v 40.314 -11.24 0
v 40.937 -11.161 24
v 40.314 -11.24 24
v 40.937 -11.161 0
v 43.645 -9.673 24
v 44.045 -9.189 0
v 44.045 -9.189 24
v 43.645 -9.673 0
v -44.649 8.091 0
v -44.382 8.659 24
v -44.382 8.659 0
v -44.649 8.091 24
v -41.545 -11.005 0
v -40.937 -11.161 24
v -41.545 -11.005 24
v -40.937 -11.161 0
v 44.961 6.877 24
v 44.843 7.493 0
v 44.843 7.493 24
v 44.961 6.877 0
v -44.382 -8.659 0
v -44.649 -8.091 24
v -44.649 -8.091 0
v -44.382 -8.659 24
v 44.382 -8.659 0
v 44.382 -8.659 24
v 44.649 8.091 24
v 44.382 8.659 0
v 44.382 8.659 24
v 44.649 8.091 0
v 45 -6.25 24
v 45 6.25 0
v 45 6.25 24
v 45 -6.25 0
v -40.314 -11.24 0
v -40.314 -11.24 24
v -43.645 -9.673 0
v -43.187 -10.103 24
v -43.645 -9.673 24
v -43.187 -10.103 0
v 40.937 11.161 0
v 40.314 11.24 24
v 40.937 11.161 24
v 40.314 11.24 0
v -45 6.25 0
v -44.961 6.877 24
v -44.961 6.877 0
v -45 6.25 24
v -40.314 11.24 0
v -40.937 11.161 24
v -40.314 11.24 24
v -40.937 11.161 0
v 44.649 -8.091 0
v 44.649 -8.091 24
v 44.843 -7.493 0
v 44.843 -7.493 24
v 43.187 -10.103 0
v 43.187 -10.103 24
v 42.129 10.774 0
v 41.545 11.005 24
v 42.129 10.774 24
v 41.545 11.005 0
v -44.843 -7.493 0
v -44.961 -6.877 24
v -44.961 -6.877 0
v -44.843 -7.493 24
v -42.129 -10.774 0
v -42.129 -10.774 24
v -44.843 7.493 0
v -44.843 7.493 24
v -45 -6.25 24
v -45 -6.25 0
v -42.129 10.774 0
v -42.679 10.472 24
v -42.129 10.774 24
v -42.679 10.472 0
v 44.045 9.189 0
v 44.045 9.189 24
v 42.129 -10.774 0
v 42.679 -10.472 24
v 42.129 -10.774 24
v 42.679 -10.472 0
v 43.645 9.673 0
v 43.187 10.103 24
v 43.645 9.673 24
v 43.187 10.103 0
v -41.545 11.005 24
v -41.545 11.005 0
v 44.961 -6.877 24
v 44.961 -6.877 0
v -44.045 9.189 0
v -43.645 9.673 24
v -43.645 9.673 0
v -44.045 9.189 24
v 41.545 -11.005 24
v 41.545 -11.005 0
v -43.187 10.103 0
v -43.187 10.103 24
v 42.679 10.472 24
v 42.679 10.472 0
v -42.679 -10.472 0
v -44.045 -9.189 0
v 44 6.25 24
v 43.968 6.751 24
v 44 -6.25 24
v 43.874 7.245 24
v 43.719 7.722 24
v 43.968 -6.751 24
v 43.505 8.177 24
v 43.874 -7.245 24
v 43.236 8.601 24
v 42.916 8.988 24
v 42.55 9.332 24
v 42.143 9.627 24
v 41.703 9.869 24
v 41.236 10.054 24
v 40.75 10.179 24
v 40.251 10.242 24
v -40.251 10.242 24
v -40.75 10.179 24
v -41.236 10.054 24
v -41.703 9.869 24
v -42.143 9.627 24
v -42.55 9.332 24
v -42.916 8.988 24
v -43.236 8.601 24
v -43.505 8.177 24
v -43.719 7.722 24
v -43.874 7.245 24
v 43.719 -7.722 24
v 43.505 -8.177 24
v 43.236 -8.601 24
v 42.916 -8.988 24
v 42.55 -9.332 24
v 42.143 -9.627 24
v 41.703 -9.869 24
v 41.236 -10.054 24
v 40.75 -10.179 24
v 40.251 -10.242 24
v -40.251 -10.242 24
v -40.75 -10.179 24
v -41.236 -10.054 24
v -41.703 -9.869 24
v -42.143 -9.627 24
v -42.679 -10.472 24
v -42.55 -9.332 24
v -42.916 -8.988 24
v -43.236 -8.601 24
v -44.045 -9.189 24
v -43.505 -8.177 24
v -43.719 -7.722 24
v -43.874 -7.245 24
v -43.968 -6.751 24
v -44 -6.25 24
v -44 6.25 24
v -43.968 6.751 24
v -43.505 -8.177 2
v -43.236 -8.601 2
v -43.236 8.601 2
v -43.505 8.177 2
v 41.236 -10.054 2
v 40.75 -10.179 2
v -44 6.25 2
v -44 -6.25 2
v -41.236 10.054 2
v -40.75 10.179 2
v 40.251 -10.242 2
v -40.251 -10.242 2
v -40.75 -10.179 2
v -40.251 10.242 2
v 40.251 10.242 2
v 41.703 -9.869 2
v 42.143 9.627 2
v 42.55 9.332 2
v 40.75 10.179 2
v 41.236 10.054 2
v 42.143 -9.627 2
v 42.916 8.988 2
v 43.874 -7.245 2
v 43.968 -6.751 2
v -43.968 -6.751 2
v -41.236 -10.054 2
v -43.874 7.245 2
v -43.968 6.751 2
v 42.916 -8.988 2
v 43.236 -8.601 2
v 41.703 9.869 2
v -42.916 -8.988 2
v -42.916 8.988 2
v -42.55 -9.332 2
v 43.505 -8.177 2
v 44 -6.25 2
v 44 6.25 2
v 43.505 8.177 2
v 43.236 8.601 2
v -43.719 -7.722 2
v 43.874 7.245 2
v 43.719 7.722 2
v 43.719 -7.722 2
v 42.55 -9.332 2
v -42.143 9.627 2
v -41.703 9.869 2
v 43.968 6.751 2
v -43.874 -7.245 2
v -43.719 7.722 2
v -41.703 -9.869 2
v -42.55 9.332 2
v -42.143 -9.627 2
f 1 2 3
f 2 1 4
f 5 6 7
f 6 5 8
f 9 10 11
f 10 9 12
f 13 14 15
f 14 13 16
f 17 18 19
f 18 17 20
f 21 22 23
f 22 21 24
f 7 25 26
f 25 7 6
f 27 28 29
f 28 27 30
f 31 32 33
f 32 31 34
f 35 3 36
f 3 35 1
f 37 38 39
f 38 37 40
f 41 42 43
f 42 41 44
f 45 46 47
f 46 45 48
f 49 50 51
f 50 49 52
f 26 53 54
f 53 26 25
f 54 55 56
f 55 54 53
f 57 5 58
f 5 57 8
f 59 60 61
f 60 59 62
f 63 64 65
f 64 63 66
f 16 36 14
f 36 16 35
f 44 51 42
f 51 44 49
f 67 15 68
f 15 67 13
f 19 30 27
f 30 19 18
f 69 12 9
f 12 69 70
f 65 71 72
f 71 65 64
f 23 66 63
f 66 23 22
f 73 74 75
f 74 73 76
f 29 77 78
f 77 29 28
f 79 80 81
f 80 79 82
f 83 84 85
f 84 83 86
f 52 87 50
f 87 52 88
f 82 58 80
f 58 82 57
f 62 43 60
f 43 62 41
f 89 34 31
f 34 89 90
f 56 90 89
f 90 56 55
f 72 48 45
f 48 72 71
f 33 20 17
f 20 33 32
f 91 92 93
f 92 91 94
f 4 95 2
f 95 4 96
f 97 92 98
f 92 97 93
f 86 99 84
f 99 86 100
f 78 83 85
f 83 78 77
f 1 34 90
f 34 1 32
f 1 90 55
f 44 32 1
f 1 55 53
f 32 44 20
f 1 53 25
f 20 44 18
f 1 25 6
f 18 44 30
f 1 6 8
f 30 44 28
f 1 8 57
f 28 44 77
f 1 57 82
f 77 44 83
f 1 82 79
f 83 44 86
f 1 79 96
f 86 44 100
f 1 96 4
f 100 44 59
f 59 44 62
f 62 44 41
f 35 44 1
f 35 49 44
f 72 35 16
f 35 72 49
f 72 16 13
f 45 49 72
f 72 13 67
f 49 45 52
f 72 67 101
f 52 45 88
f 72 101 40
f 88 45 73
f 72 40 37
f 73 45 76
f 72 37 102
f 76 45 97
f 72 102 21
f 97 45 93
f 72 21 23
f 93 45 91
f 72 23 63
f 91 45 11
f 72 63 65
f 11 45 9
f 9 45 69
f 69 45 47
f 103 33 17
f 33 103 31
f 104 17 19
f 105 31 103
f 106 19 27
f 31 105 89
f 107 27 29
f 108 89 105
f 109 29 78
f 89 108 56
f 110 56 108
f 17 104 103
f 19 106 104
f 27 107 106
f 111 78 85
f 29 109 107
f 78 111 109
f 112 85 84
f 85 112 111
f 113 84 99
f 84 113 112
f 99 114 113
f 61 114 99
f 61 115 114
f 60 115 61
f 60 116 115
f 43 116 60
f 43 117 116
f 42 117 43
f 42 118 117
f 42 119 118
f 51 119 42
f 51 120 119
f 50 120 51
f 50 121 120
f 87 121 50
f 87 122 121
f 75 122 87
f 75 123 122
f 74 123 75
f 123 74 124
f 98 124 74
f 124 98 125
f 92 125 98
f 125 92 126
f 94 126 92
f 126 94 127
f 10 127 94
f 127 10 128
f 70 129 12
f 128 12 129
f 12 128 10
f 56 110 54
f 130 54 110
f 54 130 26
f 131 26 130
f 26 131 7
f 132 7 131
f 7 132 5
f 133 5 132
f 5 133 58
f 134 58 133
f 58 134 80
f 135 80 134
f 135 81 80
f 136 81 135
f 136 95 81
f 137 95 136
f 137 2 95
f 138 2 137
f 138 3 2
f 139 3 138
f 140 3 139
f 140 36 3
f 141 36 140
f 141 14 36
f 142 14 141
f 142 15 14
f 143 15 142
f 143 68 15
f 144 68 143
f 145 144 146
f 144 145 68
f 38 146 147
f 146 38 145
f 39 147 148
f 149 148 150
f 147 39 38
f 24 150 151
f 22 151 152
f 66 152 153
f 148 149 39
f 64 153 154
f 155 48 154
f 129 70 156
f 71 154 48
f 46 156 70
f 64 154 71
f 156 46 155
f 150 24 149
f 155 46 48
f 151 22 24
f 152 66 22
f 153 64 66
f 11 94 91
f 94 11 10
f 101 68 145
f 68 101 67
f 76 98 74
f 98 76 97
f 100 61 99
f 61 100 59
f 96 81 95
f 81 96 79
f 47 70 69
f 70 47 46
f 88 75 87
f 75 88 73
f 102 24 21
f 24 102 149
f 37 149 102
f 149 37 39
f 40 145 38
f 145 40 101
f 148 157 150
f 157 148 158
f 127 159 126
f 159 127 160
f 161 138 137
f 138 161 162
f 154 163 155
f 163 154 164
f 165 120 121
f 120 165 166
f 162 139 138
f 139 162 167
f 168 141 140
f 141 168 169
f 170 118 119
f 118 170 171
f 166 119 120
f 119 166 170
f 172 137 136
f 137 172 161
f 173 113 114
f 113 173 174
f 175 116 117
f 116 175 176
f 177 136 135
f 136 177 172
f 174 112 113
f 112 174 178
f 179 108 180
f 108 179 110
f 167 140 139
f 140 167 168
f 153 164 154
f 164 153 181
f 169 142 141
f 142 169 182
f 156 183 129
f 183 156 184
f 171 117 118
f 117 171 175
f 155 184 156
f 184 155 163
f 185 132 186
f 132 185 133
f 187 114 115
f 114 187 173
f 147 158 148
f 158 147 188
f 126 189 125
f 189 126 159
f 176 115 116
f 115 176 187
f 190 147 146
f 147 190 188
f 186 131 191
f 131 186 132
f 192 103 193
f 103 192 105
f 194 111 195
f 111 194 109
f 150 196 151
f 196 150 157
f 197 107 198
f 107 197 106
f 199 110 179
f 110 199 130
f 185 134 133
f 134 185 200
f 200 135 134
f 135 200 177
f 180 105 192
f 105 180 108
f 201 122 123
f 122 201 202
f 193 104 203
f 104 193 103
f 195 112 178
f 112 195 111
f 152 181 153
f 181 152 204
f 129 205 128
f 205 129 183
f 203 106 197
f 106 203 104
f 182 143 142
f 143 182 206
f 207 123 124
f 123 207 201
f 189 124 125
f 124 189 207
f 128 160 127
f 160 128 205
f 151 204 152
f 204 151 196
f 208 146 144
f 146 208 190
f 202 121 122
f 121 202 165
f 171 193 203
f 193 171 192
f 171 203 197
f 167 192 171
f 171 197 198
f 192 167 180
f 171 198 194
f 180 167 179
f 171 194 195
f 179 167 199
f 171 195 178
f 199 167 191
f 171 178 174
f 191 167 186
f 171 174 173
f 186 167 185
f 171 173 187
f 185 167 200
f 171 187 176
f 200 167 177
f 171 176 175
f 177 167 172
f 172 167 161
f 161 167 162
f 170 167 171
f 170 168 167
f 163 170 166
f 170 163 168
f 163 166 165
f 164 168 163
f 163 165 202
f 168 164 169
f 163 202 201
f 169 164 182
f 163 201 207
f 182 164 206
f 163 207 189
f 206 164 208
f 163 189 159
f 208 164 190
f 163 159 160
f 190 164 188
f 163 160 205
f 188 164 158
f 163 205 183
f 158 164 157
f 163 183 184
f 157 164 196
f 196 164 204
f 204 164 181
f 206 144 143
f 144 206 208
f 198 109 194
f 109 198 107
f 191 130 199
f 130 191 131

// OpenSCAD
$fn = 50;


difference() {
	union() {
		hull() {
			translate(v = [-40.0000000000, 6.2500000000, 0]) {
				cylinder(h = 24, r = 5);
			}
			translate(v = [40.0000000000, 6.2500000000, 0]) {
				cylinder(h = 24, r = 5);
			}
			translate(v = [-40.0000000000, -6.2500000000, 0]) {
				cylinder(h = 24, r = 5);
			}
			translate(v = [40.0000000000, -6.2500000000, 0]) {
				cylinder(h = 24, r = 5);
			}
		}
	}
	union() {
		translate(v = [0, 0, 2]) {
			hull() {
				translate(v = [-40.0000000000, 6.2500000000, 0]) {
					cylinder(h = 22, r = 4);
				}
				translate(v = [40.0000000000, 6.2500000000, 0]) {
					cylinder(h = 22, r = 4);
				}
				translate(v = [-40.0000000000, -6.2500000000, 0]) {
					cylinder(h = 22, r = 4);
				}
				translate(v = [40.0000000000, -6.2500000000, 0]) {
					cylinder(h = 22, r = 4);
				}
			}
		}
	}
}
